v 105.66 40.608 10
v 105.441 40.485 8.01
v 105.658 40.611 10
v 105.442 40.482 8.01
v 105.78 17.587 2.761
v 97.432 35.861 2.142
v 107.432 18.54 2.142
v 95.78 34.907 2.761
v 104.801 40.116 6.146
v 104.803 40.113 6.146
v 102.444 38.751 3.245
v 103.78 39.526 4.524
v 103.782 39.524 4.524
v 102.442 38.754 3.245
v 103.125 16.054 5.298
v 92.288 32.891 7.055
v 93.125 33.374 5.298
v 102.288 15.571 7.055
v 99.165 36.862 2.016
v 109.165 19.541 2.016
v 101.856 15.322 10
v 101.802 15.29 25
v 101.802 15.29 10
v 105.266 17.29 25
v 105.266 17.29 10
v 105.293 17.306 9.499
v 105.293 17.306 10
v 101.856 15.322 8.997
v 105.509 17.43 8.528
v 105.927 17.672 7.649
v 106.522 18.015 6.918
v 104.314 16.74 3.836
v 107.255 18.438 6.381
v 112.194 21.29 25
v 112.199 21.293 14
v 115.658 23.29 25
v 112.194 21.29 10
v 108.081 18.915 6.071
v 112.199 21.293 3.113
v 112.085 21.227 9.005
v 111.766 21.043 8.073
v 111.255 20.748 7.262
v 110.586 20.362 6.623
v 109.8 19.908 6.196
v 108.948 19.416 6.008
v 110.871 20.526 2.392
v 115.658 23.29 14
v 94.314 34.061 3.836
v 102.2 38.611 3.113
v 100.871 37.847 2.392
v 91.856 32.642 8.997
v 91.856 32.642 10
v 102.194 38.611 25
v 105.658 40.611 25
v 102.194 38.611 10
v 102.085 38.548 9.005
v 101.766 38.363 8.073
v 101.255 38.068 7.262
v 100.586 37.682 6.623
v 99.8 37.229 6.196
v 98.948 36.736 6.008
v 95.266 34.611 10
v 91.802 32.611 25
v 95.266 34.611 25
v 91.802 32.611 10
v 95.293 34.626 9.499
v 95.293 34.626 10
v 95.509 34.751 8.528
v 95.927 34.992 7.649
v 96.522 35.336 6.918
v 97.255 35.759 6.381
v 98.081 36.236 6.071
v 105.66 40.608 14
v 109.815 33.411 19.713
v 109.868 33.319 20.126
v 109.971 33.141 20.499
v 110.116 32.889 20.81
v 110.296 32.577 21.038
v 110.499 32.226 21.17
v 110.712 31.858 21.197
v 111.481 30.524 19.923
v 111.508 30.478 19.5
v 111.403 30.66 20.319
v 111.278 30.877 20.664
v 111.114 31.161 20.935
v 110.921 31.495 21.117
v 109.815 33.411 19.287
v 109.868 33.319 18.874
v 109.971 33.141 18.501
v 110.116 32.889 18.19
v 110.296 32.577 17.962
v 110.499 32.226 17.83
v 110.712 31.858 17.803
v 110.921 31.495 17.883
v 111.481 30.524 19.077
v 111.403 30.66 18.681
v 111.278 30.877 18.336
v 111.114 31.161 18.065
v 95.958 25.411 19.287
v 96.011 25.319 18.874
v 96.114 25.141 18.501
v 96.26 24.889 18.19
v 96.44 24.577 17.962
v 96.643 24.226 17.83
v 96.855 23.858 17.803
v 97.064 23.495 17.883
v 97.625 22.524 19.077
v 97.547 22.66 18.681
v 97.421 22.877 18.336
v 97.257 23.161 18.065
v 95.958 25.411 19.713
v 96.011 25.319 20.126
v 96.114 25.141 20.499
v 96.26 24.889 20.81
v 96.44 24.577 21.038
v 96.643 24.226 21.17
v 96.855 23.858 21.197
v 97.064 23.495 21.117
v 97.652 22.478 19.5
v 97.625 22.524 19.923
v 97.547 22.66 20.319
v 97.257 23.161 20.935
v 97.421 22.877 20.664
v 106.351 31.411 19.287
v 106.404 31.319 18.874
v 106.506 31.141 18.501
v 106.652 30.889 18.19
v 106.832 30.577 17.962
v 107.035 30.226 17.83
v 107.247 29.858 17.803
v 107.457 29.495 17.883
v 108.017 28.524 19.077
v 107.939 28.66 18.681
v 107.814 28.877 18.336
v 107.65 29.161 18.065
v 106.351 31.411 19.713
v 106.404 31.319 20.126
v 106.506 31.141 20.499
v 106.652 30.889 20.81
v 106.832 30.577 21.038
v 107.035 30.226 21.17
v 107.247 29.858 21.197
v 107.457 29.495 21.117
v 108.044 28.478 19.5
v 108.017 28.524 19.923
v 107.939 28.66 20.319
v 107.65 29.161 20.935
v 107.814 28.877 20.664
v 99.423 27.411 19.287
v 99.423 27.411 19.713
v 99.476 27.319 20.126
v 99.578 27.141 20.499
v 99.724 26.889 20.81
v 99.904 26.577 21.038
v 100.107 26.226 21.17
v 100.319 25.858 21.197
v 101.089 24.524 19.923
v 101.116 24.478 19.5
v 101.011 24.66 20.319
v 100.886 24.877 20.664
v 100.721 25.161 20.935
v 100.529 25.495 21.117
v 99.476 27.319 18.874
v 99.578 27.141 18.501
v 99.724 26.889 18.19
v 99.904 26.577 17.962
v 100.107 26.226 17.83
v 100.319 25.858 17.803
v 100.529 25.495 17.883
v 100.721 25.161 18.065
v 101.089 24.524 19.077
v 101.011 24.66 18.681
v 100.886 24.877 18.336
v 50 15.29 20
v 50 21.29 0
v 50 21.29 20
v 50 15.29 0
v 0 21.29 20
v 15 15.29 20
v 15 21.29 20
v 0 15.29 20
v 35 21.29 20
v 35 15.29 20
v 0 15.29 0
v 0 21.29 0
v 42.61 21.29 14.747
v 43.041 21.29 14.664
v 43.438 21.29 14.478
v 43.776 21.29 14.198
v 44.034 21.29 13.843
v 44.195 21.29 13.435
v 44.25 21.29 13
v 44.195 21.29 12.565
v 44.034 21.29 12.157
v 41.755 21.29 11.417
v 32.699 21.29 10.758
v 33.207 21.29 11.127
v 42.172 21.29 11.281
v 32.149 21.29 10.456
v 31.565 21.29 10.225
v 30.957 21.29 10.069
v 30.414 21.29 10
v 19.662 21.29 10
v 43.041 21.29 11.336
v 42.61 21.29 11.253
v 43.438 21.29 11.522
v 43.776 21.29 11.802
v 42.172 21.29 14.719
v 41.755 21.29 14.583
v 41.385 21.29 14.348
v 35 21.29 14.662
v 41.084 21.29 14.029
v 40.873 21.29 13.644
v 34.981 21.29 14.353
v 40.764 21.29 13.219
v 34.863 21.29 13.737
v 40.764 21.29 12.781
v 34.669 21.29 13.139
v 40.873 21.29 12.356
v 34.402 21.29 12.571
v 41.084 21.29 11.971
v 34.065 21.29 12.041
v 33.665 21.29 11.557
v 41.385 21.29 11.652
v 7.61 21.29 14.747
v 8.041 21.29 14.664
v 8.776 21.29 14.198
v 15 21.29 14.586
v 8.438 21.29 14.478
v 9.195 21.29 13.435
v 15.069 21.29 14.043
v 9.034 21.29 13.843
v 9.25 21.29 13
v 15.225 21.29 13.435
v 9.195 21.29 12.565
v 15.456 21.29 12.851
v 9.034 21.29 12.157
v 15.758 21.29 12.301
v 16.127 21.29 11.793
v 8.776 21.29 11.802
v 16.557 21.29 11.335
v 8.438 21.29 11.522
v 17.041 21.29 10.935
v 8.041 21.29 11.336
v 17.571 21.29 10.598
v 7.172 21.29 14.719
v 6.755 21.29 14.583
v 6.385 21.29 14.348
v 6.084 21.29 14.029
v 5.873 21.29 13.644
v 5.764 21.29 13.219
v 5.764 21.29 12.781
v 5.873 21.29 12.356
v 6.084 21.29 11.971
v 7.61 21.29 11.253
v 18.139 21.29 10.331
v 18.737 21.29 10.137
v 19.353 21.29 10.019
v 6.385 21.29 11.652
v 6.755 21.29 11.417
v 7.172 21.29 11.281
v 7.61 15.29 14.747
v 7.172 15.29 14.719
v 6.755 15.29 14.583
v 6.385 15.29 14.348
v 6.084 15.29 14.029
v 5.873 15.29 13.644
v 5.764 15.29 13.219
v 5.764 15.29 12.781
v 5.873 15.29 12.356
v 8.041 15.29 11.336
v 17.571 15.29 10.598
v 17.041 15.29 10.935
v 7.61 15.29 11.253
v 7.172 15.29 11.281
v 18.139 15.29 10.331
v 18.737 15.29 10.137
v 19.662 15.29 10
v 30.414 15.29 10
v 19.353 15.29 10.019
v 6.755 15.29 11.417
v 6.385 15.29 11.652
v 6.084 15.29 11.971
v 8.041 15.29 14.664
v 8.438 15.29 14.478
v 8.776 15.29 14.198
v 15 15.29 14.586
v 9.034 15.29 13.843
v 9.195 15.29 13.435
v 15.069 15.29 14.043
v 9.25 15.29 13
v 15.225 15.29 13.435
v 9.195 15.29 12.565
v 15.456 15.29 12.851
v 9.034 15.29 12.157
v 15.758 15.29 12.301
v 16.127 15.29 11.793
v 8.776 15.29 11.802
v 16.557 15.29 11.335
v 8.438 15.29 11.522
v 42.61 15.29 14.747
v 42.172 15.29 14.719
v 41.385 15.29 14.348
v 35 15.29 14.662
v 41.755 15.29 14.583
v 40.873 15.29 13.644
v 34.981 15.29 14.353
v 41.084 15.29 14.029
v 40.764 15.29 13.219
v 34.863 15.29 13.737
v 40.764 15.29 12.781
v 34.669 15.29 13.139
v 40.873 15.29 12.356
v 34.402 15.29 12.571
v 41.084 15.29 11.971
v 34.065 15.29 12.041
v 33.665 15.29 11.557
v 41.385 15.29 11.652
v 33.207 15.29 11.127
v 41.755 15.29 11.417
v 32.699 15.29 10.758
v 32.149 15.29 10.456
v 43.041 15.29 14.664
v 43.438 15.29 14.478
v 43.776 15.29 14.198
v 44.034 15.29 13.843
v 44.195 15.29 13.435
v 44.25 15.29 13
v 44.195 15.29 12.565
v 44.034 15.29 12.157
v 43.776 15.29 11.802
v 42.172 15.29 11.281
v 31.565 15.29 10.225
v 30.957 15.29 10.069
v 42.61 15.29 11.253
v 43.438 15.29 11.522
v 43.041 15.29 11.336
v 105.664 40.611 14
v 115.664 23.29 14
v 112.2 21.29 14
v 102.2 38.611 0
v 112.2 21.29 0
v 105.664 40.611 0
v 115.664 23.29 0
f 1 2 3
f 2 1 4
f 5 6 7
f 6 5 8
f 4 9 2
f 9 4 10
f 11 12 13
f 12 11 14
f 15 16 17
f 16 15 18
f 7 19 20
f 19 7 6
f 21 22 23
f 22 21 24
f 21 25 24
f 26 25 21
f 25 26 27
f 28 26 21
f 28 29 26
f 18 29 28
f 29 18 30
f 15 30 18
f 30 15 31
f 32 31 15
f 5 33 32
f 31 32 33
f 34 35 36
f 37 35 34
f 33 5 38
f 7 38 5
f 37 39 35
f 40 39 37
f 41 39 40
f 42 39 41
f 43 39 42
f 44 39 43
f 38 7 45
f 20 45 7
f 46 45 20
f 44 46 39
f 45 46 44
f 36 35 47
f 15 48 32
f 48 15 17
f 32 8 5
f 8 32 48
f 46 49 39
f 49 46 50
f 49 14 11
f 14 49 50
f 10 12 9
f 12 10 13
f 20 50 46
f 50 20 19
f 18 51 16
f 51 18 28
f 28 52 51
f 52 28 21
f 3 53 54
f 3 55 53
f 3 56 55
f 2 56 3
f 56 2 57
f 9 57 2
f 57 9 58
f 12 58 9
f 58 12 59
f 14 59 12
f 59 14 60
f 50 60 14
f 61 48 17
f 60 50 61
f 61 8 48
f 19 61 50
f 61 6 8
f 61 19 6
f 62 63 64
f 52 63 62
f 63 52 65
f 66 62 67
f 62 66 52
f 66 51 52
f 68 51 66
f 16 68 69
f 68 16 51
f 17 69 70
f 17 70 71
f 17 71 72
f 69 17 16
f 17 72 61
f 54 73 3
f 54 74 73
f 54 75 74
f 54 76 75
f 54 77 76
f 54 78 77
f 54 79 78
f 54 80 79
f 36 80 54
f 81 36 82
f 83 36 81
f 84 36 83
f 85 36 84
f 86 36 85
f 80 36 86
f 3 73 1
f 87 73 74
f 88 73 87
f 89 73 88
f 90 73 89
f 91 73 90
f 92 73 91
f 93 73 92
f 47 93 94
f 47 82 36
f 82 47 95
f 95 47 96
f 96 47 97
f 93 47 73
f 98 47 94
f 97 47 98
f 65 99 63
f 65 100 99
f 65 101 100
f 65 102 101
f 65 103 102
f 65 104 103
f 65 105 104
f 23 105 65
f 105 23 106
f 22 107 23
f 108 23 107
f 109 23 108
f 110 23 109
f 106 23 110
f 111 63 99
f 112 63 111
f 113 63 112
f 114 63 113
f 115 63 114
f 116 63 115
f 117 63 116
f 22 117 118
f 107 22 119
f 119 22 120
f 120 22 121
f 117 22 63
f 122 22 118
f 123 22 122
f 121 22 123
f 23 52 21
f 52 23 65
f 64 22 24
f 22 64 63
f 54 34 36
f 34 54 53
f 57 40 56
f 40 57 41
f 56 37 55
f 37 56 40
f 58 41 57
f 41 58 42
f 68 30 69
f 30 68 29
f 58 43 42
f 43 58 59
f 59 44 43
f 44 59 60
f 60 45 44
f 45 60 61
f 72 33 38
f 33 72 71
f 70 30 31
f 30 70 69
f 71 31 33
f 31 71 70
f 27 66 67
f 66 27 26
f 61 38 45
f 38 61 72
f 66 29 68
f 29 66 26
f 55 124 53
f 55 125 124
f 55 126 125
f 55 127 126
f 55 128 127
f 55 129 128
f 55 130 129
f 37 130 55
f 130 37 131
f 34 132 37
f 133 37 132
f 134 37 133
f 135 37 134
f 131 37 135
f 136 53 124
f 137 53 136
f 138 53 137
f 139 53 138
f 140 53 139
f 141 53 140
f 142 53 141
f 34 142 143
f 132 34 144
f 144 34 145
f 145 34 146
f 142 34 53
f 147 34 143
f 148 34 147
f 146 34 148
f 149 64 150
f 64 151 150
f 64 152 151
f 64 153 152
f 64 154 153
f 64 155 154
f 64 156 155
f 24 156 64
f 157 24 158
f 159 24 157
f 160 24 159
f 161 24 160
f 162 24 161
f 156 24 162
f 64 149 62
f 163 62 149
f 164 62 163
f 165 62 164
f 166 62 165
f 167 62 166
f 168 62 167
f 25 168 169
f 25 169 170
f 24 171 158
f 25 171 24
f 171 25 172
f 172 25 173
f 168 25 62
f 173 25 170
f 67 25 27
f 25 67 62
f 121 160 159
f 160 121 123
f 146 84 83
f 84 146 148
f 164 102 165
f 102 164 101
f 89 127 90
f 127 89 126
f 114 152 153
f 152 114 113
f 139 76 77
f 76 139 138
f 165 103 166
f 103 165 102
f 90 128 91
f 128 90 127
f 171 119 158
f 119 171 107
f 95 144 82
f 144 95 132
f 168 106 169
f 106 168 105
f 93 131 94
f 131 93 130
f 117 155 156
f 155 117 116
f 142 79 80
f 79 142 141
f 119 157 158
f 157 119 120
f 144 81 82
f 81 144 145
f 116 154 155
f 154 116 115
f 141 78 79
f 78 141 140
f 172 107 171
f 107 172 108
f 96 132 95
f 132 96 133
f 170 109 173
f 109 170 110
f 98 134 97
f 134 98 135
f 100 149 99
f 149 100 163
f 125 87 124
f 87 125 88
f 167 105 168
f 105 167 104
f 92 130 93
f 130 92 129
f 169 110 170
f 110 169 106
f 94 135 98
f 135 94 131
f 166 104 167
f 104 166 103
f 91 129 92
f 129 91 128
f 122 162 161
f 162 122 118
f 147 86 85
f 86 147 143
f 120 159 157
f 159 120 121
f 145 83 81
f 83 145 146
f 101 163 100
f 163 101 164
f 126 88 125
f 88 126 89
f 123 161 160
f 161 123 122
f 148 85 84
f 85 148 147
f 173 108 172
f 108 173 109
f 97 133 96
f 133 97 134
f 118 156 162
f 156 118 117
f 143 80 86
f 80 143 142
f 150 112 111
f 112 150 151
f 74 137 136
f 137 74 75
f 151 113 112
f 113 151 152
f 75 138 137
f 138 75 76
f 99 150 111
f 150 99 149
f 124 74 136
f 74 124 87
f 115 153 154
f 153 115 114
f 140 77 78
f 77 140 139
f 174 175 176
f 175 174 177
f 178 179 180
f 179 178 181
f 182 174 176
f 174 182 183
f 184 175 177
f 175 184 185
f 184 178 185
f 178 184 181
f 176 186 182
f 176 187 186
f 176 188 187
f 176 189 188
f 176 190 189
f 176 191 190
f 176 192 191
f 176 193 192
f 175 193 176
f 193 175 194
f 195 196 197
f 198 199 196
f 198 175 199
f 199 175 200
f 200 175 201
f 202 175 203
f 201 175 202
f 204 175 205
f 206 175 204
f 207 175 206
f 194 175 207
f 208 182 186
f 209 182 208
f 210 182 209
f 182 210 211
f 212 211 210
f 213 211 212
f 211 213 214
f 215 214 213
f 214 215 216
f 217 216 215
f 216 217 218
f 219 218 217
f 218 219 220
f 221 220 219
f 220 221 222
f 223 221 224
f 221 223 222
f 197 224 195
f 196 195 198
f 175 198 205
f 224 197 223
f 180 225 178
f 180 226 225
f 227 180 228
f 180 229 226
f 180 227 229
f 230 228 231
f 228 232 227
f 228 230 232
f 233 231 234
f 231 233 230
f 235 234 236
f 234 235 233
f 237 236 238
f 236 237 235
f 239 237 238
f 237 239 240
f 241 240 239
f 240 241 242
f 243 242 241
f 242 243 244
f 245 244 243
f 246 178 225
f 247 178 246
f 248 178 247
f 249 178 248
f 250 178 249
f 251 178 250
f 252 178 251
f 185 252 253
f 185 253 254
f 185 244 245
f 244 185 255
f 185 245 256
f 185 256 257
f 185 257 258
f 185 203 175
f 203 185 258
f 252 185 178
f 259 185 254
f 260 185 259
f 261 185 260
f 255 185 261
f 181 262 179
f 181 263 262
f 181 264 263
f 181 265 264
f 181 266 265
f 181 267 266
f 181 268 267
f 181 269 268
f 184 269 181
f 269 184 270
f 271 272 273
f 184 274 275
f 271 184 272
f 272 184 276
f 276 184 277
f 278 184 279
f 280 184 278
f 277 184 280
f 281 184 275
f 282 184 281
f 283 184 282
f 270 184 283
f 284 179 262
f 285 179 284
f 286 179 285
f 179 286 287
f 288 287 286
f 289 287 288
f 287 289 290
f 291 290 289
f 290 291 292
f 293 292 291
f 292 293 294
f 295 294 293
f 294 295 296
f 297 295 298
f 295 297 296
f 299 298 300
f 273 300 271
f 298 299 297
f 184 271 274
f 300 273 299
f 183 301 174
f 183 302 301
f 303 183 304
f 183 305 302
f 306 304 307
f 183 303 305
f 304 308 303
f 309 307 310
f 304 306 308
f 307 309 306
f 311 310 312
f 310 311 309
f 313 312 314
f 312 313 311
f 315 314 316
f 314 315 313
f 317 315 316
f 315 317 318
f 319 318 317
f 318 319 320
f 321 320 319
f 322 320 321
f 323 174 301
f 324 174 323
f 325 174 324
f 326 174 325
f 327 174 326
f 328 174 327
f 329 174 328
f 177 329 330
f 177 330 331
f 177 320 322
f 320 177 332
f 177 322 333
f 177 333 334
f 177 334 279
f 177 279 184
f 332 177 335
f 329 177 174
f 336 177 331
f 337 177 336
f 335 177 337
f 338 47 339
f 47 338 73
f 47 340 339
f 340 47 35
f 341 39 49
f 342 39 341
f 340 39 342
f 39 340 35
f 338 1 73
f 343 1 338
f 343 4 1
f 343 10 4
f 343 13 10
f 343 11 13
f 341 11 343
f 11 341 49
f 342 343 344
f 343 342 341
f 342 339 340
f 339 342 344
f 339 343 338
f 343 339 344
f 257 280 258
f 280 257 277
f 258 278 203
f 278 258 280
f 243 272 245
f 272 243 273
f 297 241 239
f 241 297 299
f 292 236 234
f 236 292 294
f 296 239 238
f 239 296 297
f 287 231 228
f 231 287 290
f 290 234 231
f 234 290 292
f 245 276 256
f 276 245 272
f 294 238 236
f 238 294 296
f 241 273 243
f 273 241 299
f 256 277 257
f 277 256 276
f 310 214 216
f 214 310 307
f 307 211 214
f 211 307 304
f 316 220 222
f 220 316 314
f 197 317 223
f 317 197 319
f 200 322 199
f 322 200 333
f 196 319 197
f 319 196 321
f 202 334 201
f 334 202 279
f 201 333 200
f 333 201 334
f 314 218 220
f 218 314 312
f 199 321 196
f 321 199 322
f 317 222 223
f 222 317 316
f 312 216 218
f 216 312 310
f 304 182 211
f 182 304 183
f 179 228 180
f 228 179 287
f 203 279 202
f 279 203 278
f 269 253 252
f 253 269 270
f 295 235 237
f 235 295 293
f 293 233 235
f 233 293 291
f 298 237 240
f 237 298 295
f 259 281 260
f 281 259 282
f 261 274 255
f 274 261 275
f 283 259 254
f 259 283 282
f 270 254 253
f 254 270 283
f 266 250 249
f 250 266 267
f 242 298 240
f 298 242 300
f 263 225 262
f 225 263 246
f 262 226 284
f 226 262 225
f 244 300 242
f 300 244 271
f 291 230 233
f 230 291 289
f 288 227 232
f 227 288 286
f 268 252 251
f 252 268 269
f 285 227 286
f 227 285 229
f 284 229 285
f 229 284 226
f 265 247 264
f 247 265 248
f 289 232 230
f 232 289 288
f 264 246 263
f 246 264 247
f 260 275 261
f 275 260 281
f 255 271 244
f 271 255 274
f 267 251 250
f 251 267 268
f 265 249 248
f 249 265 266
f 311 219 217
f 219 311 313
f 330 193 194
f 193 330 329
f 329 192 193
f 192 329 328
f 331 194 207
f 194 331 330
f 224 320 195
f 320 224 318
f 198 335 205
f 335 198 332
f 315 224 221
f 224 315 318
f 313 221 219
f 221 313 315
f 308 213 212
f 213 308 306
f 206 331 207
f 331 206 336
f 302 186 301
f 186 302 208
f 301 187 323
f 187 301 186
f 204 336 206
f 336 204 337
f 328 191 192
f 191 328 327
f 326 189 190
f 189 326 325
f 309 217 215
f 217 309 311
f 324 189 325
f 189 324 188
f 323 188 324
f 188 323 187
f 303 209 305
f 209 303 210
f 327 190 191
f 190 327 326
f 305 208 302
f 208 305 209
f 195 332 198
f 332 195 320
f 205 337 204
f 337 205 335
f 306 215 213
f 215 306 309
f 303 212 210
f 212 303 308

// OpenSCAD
// file: library/component-data.scad
// ========================================================================================
// Robori Mendel
// Dimensions of standard components
// GNU GPL v3
//
// Contact : support@robori.com
// Reference : http://www.robori.com/documentation/Mendel
//
// History :
// 31 Jan 2015 - First version
// ========================================================================================

// Linear bearing LM8UU
LM8UU_L = 24;
LM8UU_OD = 15;
LM8UU_ID = 8;

// Pulley GT2
PULLEY_GT2_ID = 5;
PULLEY_GT2_OD = 18;
PULLEY_GT2_L = 18.5;
PULLEY_GT2_FLANGE_L = 1.5;
PULLEY_GT2_TEETH_L = 7.5;
PULLEY_GT2_TEETH_OD = 10;
PULLEY_GT2_HUB_L =  PULLEY_GT2_L - PULLEY_GT2_FLANGE_L - PULLEY_GT2_TEETH_L;		// = 9.5

// Nylock nut
NYLOCK_NUT_M5_H = 5;

// NEMA 17
NEMA17_L = 42;
NEMA17_SCREW_FROM_EDGE = (42 - 31)/2;
NEMA17_SCREW_SIZE = 3;

// Fan 40mm x 40mm
FAN40_L = 40;
FAN40_ID = 38;
FAN40_SCREW_D = 3.4;
FAN40_SCREW_FROM_EDGE = 4;

// Washer
WASHER_M3_ID = 3.2;
WASHER_M3_OD = 6;
WASHER_M3_H = 0.5;
// file: pcb-clamp-data.scad
// ========================================================================================
// Robori Mendel
// Shared data for RAMPS stack mounting
// GNU GPL v3
//
// Contact : support@robori.com
// Reference : http://www.robori.com/documentation/Mendel
//
// History :
// 15 Feb 2015 - First version
// ========================================================================================

// Fan holder mount
fan_holder_mount_l = 50;
fan_holder_mount_w = 20;
fan_holder_mount_h = 6;
fan_holder_mount_void_l = 20;
fan_holder_mount_void_from_edge = 4;
fan_holder_mount_screw_d = 3 + 0.5;
fan_holder_mount_screw1_x = 7.5;
fan_holder_mount_screw2_x = 42.5;
fan_holder_mount_screw_y = fan_holder_mount_h + (fan_holder_mount_w - fan_holder_mount_h)/2;
// file: library/library_3d.scad
// ========================================================================================
// Robori Mendel
// General 3D library
// GNU GPL v3
//
// Contact : support@robori.com
// Reference : http://www.robori.com/documentation/Mendel
//
// History :
// 2013 - First version
// ========================================================================================

lib3d_fn = 50;

// TESTING
//lib3d_hex_nut_recess(3);
//lib3d_round_cube(10, 8, 10, 1, true, false, true, false);


// Hexagonal nut recess
module lib3d_hex_nut_recess(size)
{
	length = 0.8*size;
	hex_r = 1.8*size/2;
	cylinder(h=length, r=hex_r, center=false, $fn=6);
}

// Cube with customized rounded corners
module lib3d_round_cube(x, y, z, rad, left_top=true, left_bottom=true, right_top=true, right_bottom=true)
{
	rx = x/2 - rad + 0.02;
	ry = y/2 - rad + 0.02;

	translate([x/2, y/2, 0]) difference()
	{	
		translate([-x/2, -y/2, 0]) cube([x, y, z]);
		if (left_top)
			translate([-rx, ry, -1]) rotate([0, 0, 90]) __lib3d_round_corner(rad, z + 2);
		if (left_bottom)
			translate([-rx, -ry, -1]) rotate([0, 0, 180]) __lib3d_round_corner(rad, z + 2);
		if (right_top)
			translate([rx, ry, -1]) __lib3d_round_corner(rad, z + 2);
		if (right_bottom)
			translate([rx, -ry, -1]) rotate([0, 0, 270]) __lib3d_round_corner(rad, z + 2);
	}
}

// Helper
module __lib3d_round_corner(rad, height)
{
	difference()
	{
		cube([rad, rad, height]);
		cylinder(h=height, r=rad, center=false, $fn=lib3d_fn);
	}
}
// file: library/component.scad
// ========================================================================================
// Robori Mendel
// RP library
// GNU GPL v3
//
// Contact : support@robori.com
// Reference : http://www.robori.com/documentation/Mendel
//
// History :
// 31 Jan 2015 - First version
// ========================================================================================

include <component-data.scad>

component_fn = 25;

// Rod clamp
module clamp(in_dia, out_dia, leg_length, leg_space, height, screw_dia, screw_dist_from_end)
{
	difference()
	{
		union()
		{
			cylinder(h=height, r=out_dia/2, center=false, $fn=component_fn);
			translate([-out_dia/2, -in_dia/2 - leg_length, 0]) cube([out_dia, in_dia/2 + leg_length, height]);
		}
		// hole
		translate([0, 0, -1]) cylinder(h=height + 2, r=in_dia/2, center=false, $fn=component_fn);
		// leg space
		translate([-leg_space/2, -in_dia/2 - leg_length - 1, -1]) cube([leg_space, in_dia/2 + leg_length + 1, height + 2]);
		// screw hole
		translate([-out_dia/2 - 1, -in_dia/2 - leg_length + screw_dist_from_end, height/2]) rotate([0, 90, 0]) cylinder(h=out_dia + 2, r=screw_dia/2, center=false, $fn=component_fn);
	}
}

// LM8UU holder
lm8uu_holder_wall_t = 3;
lm8uu_holder_cone_l = 2;
lm8uu_holder_slot_w = 9;
lm8uu_holder_id = LM8UU_OD - 0.1;
lm8uu_holder_l = LM8UU_L + lm8uu_holder_cone_l;
lm8uu_holder_w = LM8UU_OD + 2*lm8uu_holder_wall_t;
lm8uu_holder_h = LM8UU_OD + 2*lm8uu_holder_cone_l;

module lm8uu_holder()
{
	cone_d1 = 0;
	cone_d2 = LM8UU_OD + 2*lm8uu_holder_cone_l;
	cone_h = cone_d2/2;

	difference()
	{
		// Block
		cube([lm8uu_holder_l, lm8uu_holder_w, lm8uu_holder_h]);
		// Cylinder
		translate([-1, lm8uu_holder_w/2, lm8uu_holder_cone_l + LM8UU_OD/2]) rotate([0, 90, 0]) cylinder(r=lm8uu_holder_id/2, h=lm8uu_holder_l + 2, center=false, $fn=component_fn);
		// Cone
		translate([lm8uu_holder_l - cone_h + 0.01, lm8uu_holder_w/2, lm8uu_holder_cone_l + LM8UU_OD/2]) rotate([0, 90, 0]) cylinder(r1=cone_d1/2, r2=cone_d2/2, h=cone_h, center=false, $fn=component_fn);
		// Slot
		translate([-1, lm8uu_holder_w/2 - lm8uu_holder_slot_w/2, lm8uu_holder_h - lm8uu_holder_cone_l*2 - 1]) cube([lm8uu_holder_l + 2, lm8uu_holder_slot_w, lm8uu_holder_cone_l*2 + 2]);
	}
}
// main file
// ========================================================================================
// Robori Mendel
// Top clamp level for RAMPS stack
// GNU GPL v3
//
// Contact : support@robori.com
// Reference : http://www.robori.com/documentation/Mendel
//
// History :
// 15 Feb 2015 - First version
// ========================================================================================

include <library/component.scad>
include <library/library_3d.scad>
include <pcb-clamp-data.scad>

$fn = 25;

// PCB
pcb_screw_d = 125/1000*25.4 + 0.4;

// Plate
plate_h = 6;

pcb_clamp_top();

module pcb_clamp_top()
{
	in_dia = 8;
	out_dia = 16;
	leg_length = 11;
	leg_space = 8;
	height = 20;
	screw_dia = 3 + 0.4;
	screw_dist_from_end = 5.5;

	translate([0, 15.29, 0]) difference()
	{
		union()
		{
			// plate
			translate([-48.83, -69.5, 0]) linear_extrude(height=plate_h, center=false, convexity=10) import(file="../dxf/controller-assembly.dxf", layer="pcb-clamp-top-profile");
			// fan holder mount
			cube([fan_holder_mount_l, fan_holder_mount_h, fan_holder_mount_w]);
			// clamp
			translate([108.73, 4, in_dia/2 + plate_h]) rotate([-90, 0, 30]) clamp(in_dia, out_dia, leg_length, leg_space, height, screw_dia, screw_dist_from_end);
			translate([112.2, 6, 0]) rotate([0, 0, 30]) cube([out_dia/2 - in_dia/2, 20, plate_h + in_dia]);
		}
		// pcb mount screw hole
		translate([8.24, -8.7, -1]) cylinder(r=pcb_screw_d/2, h=plate_h + 2, center=false);
		// fan holder mount screw holes
		translate([fan_holder_mount_screw1_x, -1, fan_holder_mount_screw_y]) rotate([-90, 0, 0]) cylinder(r=fan_holder_mount_screw_d/2, h=fan_holder_mount_h + 2, center=false);
		translate([fan_holder_mount_screw2_x, -1, fan_holder_mount_screw_y]) rotate([-90, 0, 0]) cylinder(r=fan_holder_mount_screw_d/2, h=fan_holder_mount_h + 2, center=false);
		// fan holder mount void
		translate([fan_holder_mount_l/2 - fan_holder_mount_void_l/2, -1, fan_holder_mount_w + 1]) rotate([-90, 0, 0]) lib3d_round_cube(fan_holder_mount_void_l, fan_holder_mount_w - plate_h - fan_holder_mount_void_from_edge + 1,fan_holder_mount_h + 2 ,5, true, false, true, false);
	}
}
